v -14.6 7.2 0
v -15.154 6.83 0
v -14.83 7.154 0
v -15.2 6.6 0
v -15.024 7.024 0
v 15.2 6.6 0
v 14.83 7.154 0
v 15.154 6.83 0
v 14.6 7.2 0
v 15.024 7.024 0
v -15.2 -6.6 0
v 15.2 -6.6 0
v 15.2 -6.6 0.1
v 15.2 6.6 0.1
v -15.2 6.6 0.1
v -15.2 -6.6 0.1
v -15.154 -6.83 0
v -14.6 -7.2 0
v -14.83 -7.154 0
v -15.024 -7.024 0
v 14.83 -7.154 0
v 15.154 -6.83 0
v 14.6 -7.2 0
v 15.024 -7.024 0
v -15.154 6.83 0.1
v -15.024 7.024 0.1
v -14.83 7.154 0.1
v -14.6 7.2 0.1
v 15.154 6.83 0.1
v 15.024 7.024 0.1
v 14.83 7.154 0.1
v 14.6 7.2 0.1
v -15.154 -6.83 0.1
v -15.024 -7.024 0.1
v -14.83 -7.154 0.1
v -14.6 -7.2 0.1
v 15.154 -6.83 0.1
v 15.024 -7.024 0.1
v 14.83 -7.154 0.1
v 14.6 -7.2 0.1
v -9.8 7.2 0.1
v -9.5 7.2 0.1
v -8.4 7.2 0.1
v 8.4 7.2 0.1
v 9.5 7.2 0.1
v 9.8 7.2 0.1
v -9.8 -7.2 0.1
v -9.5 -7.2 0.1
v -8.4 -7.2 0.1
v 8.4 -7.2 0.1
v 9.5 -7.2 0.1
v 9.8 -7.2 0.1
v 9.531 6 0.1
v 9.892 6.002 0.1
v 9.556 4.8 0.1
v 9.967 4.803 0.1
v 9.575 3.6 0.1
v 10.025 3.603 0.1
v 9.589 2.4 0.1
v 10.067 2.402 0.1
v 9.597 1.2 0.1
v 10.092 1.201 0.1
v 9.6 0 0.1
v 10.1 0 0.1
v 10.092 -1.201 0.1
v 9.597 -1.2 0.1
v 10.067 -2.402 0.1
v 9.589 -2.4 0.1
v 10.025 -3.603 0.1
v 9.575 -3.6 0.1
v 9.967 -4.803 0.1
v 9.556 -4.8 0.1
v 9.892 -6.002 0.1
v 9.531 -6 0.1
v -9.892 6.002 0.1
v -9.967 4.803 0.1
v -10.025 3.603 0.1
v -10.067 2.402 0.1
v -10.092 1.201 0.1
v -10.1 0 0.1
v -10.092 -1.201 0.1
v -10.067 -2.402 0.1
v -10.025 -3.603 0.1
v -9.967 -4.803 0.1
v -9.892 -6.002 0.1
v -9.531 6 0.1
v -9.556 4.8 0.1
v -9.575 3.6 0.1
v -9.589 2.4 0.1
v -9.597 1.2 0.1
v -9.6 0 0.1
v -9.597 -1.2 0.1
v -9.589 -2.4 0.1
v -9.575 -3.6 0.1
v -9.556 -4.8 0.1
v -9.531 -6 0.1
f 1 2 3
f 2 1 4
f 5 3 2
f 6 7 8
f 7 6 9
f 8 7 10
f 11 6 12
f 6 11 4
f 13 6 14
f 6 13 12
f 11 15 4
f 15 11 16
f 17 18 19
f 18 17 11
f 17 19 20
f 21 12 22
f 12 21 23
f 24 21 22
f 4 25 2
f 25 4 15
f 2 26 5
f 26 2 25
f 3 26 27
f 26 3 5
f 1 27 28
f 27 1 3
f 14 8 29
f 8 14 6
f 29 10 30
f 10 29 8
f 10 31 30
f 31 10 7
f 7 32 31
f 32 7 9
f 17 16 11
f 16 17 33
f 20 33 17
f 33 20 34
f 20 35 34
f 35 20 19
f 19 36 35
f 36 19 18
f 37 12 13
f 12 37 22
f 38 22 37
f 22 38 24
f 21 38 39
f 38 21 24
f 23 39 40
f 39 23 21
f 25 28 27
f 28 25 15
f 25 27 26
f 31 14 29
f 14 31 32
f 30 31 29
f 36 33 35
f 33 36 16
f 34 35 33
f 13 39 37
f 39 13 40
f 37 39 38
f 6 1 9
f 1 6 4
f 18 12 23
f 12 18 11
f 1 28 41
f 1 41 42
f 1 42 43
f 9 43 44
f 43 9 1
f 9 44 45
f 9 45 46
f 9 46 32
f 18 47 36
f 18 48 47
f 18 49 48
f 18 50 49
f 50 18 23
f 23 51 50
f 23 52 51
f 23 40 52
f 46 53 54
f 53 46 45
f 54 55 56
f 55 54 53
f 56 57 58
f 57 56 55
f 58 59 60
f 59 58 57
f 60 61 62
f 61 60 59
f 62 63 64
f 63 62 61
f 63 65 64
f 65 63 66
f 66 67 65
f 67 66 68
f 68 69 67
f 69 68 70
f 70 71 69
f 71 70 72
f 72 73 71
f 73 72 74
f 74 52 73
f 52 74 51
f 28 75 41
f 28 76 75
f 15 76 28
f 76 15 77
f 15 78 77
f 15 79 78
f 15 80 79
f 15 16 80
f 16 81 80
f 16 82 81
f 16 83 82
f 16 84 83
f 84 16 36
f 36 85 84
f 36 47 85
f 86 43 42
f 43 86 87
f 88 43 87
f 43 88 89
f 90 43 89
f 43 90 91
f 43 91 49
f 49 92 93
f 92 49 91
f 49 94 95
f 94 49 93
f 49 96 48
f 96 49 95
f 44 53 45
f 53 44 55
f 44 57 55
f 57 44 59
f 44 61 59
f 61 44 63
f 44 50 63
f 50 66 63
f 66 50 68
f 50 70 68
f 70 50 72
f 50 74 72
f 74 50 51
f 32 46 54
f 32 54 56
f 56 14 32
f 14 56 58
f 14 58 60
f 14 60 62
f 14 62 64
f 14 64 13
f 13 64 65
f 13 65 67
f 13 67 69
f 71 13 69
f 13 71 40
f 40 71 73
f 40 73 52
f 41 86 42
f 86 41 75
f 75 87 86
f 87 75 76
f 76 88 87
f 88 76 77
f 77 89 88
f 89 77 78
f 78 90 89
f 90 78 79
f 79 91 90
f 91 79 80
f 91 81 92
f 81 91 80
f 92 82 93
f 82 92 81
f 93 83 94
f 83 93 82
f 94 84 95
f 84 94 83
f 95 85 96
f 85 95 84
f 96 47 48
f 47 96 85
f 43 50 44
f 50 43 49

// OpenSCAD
// file: ../p/box3u12.scad
use <../lib.scad>
function ldraw_lib__box3u12() = [
// 0 Box with 3 Parallel Faces without Any Edges
// 0 Name: box3u12.dat
// 0 Author: J.C. Tchang [tchang]
// 0 !LDRAW_ORG Primitive UPDATE 2014-02
// 0 !LICENSE Licensed under CC BY 4.0 : see CAreadme.txt
// 
// 0 BFC CERTIFY CCW
  [0,"BFC","CERTIFY"],
  [0,"BFC","CCW"],
// 
// 0 !HISTORY 2014-12-23 [PTadmin] Official Update 2014-02
// 
// 
// 4 16 -1 1 1 1 1 1 1 1 -1 -1 1 -1
  [4,16,-1,1,1,1,1,1,1,1,-1,-1,1,-1],
// 4 16 -1 1 1 -1 0 1 1 0 1 1 1 1
  [4,16,-1,1,1,-1,0,1,1,0,1,1,1,1],
// 4 16 1 1 -1 1 0 -1 -1 0 -1 -1 1 -1
  [4,16,1,1,-1,1,0,-1,-1,0,-1,-1,1,-1],
];
module ldraw_lib__box3u12(step=0, col=false, unit=2/5, alt=false, line=0.2, solid=!$preview)
    makepoly(ldraw_lib__box3u12(), step=step, col=col, unit=unit, alt=alt, line=line, solid=solid);
ldraw_lib__box3u12(line=0.2);
// file: ../p/1-4cyli.scad
use <../lib.scad>
function ldraw_lib__1_4cyli() = [
// 0 Cylinder 0.25
// 0 Name: 1-4cyli.dat
// 0 Author: James Jessiman
// 0 !LDRAW_ORG Primitive UPDATE 2012-01
// 0 !LICENSE Licensed under CC BY 4.0 : see CAreadme.txt
// 
// 0 BFC CERTIFY CCW
  [0,"BFC","CERTIFY"],
  [0,"BFC","CCW"],
// 
// 0 !HISTORY 2002-03-23 [sbliss] Added BFC statement.
// 0 !HISTORY 2002-04-25 [PTadmin] Official Update 2002-02
// 0 !HISTORY 2007-06-22 [PTadmin] Header formatted for Contributor Agreement
// 0 !HISTORY 2008-07-01 [PTadmin] Official Update 2008-01
// 0 !HISTORY 2012-02-16 [Philo] Changed to CCW
// 0 !HISTORY 2012-03-30 [PTadmin] Official Update 2012-01
// 
// 
// 4 16 1 1 0 0.9239 1 0.3827 0.9239 0 0.3827 1 0 0
  [4,16,1,1,0,0.9239,1,0.3827,0.9239,0,0.3827,1,0,0],
// 5 24 1 0 0 1 1 0 0.9239 0 0.3827 1 0 -1
  [5,24,1,0,0,1,1,0,0.9239,0,0.3827,1,0,-1],
// 4 16 0.9239 1 0.3827 0.7071 1 0.7071 0.7071 0 0.7071 0.9239 0 0.3827
  [4,16,0.9239,1,0.3827,0.7071,1,0.7071,0.7071,0,0.7071,0.9239,0,0.3827],
// 5 24 0.9239 0 0.3827 0.9239 1 0.3827 0.7071 0 0.7071 1 0 0
  [5,24,0.9239,0,0.3827,0.9239,1,0.3827,0.7071,0,0.7071,1,0,0],
// 4 16 0.7071 1 0.7071 0.3827 1 0.9239 0.3827 0 0.9239 0.7071 0 0.7071
  [4,16,0.7071,1,0.7071,0.3827,1,0.9239,0.3827,0,0.9239,0.7071,0,0.7071],
// 5 24 0.7071 0 0.7071 0.7071 1 0.7071 0.3827 0 0.9239 0.9239 0 0.3827
  [5,24,0.7071,0,0.7071,0.7071,1,0.7071,0.3827,0,0.9239,0.9239,0,0.3827],
// 4 16 0.3827 1 0.9239 0 1 1 0 0 1 0.3827 0 0.9239
  [4,16,0.3827,1,0.9239,0,1,1,0,0,1,0.3827,0,0.9239],
// 5 24 0.3827 0 0.9239 0.3827 1 0.9239 0 0 1 0.7071 0 0.7071
  [5,24,0.3827,0,0.9239,0.3827,1,0.9239,0,0,1,0.7071,0,0.7071],
// 5 24 0 0 1 0 1 1 0.3827 0 0.9239 -1 0 1
  [5,24,0,0,1,0,1,1,0.3827,0,0.9239,-1,0,1],
];
module ldraw_lib__1_4cyli(step=0, col=false, unit=2/5, alt=false, line=0.2, solid=!$preview)
    makepoly(ldraw_lib__1_4cyli(), step=step, col=col, unit=unit, alt=alt, line=line, solid=solid);
ldraw_lib__1_4cyli(line=0.2);
// file: ../p/1-4chrd.scad
use <../lib.scad>
function ldraw_lib__1_4chrd() = [
// 0 Chord 0.25
// 0 Name: 1-4chrd.dat
// 0 Author: Max Martin Richter [MMR1988]
// 0 !LDRAW_ORG Primitive UPDATE 2023-05
// 0 !LICENSE Licensed under CC BY 4.0 : see CAreadme.txt
// 
// 0 BFC CERTIFY CCW
  [0,"BFC","CERTIFY"],
  [0,"BFC","CCW"],
// 
// 0 !HISTORY 2004-04-22 [PTadmin] Official Update 2004-02
// 0 !HISTORY 2007-10-09 [PTadmin] Header formatted for Contributor Agreement
// 0 !HISTORY 2008-07-01 [PTadmin] Official Update 2008-01
// 0 !HISTORY 2012-08-02 [MMR1988] Re-creation with PrimGen2 and Rectifier
// 0 !HISTORY 2012-08-09 [PTadmin] Official Update 2012-02
// 0 !HISTORY 2023-10-27 [OrionP] Change author to MMR1988 from hafhead
// 0 !HISTORY 2023-10-31 [OrionP] Official Update 2023-05
// 
// 4 16 0.9239 0 0.3827 0.3827 0 0.9239 0 0 1 1 0 0
  [4,16,0.9239,0,0.3827,0.3827,0,0.9239,0,0,1,1,0,0],
// 3 16 0.7071 0 0.7071 0.3827 0 0.9239 0.9239 0 0.3827
  [3,16,0.7071,0,0.7071,0.3827,0,0.9239,0.9239,0,0.3827],
];
module ldraw_lib__1_4chrd(step=0, col=false, unit=2/5, alt=false, line=0.2, solid=!$preview)
    makepoly(ldraw_lib__1_4chrd(), step=step, col=col, unit=unit, alt=alt, line=line, solid=solid);
ldraw_lib__1_4chrd(line=0.2);
// main file
use <../lib.scad>
use <../p/1-4chrd.scad>
use <../p/1-4cyli.scad>
use <../p/box3u12.scad>
function ldraw_lib__6141955c() = [
// 0 Sticker  1.8 x  3.8 with White Stripe and Black and White Arcs on Blue Background (Needs Work)
// 0 Name: 6141955c.dat
// 0 Author: Massimo Maso [Sirio]
// 0 !LDRAW_ORG Part UPDATE 2025-03
// 0 !LICENSE Licensed under CC BY 4.0 : see CAreadme.txt
// 
// 0 !HELP Needs work: Some parts should be halftones.
// 0 !HELP I indicated them as halftone color code disc - color code ndis.
// 0 !HELP For now I don't have enough information to create the matrix of dots.
// 
// 0 BFC CERTIFY CCW
  [0,"BFC","CERTIFY"],
  [0,"BFC","CCW"],
// 
// 0 !KEYWORDS Bricklink 75871stk01a, Brickowl 197362, Ford, GT, Mustang
// 0 !KEYWORDS Rebrickable 24746, Set 75871, Speed Champions
// 
// 0 !HISTORY 2025-03-30 [OrionP] Official Update 2025-03
// 
// 
// 0 // Primitives
// 1 16 -36.5 0 16.5 -1.5 0 0 0 -1 0 0 0 1.5 1-4chrd.dat
  [1,16,-36.5,0,16.5,-1.5,0,0,0,-1,0,0,0,1.5, ldraw_lib__1_4chrd()],
// 1 16 36.5 0 16.5 1.5 0 0 0 -1 0 0 0 1.5 1-4chrd.dat
  [1,16,36.5,0,16.5,1.5,0,0,0,-1,0,0,0,1.5, ldraw_lib__1_4chrd()],
// 1 16 0 -.25 0 0 0 38 0 .25 0 16.5 0 0 box3u12.dat
  [1,16,0,-.25,0,0,0,38,0,.25,0,16.5,0,0, ldraw_lib__box3u12()],
// 1 16 -36.5 0 -16.5 -1.5 0 0 0 -1 0 0 0 -1.5 1-4chrd.dat
  [1,16,-36.5,0,-16.5,-1.5,0,0,0,-1,0,0,0,-1.5, ldraw_lib__1_4chrd()],
// 1 16 36.5 0 -16.5 1.5 0 0 0 -1 0 0 0 -1.5 1-4chrd.dat
  [1,16,36.5,0,-16.5,1.5,0,0,0,-1,0,0,0,-1.5, ldraw_lib__1_4chrd()],
// 1 16 -36.5 0 16.5 -1.5 0 0 0 -.25 0 0 0 1.5 1-4cyli.dat
  [1,16,-36.5,0,16.5,-1.5,0,0,0,-.25,0,0,0,1.5, ldraw_lib__1_4cyli()],
// 1 16 36.5 0 16.5 1.5 0 0 0 -.25 0 0 0 1.5 1-4cyli.dat
  [1,16,36.5,0,16.5,1.5,0,0,0,-.25,0,0,0,1.5, ldraw_lib__1_4cyli()],
// 1 16 -36.5 0 -16.5 -1.5 0 0 0 -.25 0 0 0 -1.5 1-4cyli.dat
  [1,16,-36.5,0,-16.5,-1.5,0,0,0,-.25,0,0,0,-1.5, ldraw_lib__1_4cyli()],
// 1 16 36.5 0 -16.5 1.5 0 0 0 -.25 0 0 0 -1.5 1-4cyli.dat
  [1,16,36.5,0,-16.5,1.5,0,0,0,-.25,0,0,0,-1.5, ldraw_lib__1_4cyli()],
// 1 1 -36.5 -.25 16.5 -1.5 0 0 0 1 0 0 0 1.5 1-4chrd.dat
  [1,1,-36.5,-.25,16.5,-1.5,0,0,0,1,0,0,0,1.5, ldraw_lib__1_4chrd()],
// 1 1 36.5 -.25 16.5 1.5 0 0 0 1 0 0 0 1.5 1-4chrd.dat
  [1,1,36.5,-.25,16.5,1.5,0,0,0,1,0,0,0,1.5, ldraw_lib__1_4chrd()],
// 1 1 -36.5 -.25 -16.5 -1.5 0 0 0 1 0 0 0 -1.5 1-4chrd.dat
  [1,1,-36.5,-.25,-16.5,-1.5,0,0,0,1,0,0,0,-1.5, ldraw_lib__1_4chrd()],
// 1 1 36.5 -.25 -16.5 1.5 0 0 0 1 0 0 0 -1.5 1-4chrd.dat
  [1,1,36.5,-.25,-16.5,1.5,0,0,0,1,0,0,0,-1.5, ldraw_lib__1_4chrd()],
// 0 // Bottom face
// 4 16 36.5 0 18 38 0 16.5 -38 0 16.5 -36.5 0 18
  [4,16,36.5,0,18,38,0,16.5,-38,0,16.5,-36.5,0,18],
// 4 16 36.5 0 -18 -36.5 0 -18 -38 0 -16.5 38 0 -16.5
  [4,16,36.5,0,-18,-36.5,0,-18,-38,0,-16.5,38,0,-16.5],
// 0 // Lateral face
// 3 16 -36.5 0 18 -36.5 -.25 18 -24.5 -.25 18
  [3,16,-36.5,0,18,-36.5,-.25,18,-24.5,-.25,18],
// 3 16 -36.5 0 18 -24.5 -.25 18 -23.75 -.25 18
  [3,16,-36.5,0,18,-24.5,-.25,18,-23.75,-.25,18],
// 3 16 -36.5 0 18 -23.75 -.25 18 -21 -.25 18
  [3,16,-36.5,0,18,-23.75,-.25,18,-21,-.25,18],
// 4 16 -36.5 0 18 -21 -.25 18 21 -.25 18 36.5 0 18
  [4,16,-36.5,0,18,-21,-.25,18,21,-.25,18,36.5,0,18],
// 3 16 36.5 0 18 21 -.25 18 23.75 -.25 18
  [3,16,36.5,0,18,21,-.25,18,23.75,-.25,18],
// 3 16 36.5 0 18 23.75 -.25 18 24.5 -.25 18
  [3,16,36.5,0,18,23.75,-.25,18,24.5,-.25,18],
// 3 16 36.5 0 18 24.5 -.25 18 36.5 -.25 18
  [3,16,36.5,0,18,24.5,-.25,18,36.5,-.25,18],
// 3 16 -36.5 0 -18 -24.5 -.25 -18 -36.5 -.25 -18
  [3,16,-36.5,0,-18,-24.5,-.25,-18,-36.5,-.25,-18],
// 3 16 -36.5 0 -18 -23.75 -.25 -18 -24.5 -.25 -18
  [3,16,-36.5,0,-18,-23.75,-.25,-18,-24.5,-.25,-18],
// 3 16 -36.5 0 -18 -21 -.25 -18 -23.75 -.25 -18
  [3,16,-36.5,0,-18,-21,-.25,-18,-23.75,-.25,-18],
// 4 16 -36.5 0 -18 36.5 0 -18 21 -.25 -18 -21 -.25 -18
  [4,16,-36.5,0,-18,36.5,0,-18,21,-.25,-18,-21,-.25,-18],
// 3 16 36.5 0 -18 23.75 -.25 -18 21 -.25 -18
  [3,16,36.5,0,-18,23.75,-.25,-18,21,-.25,-18],
// 3 16 36.5 0 -18 24.5 -.25 -18 23.75 -.25 -18
  [3,16,36.5,0,-18,24.5,-.25,-18,23.75,-.25,-18],
// 3 16 36.5 0 -18 36.5 -.25 -18 24.5 -.25 -18
  [3,16,36.5,0,-18,36.5,-.25,-18,24.5,-.25,-18],
// 0 // Top face
// 0 // Black arc faces
// 4 0 24.7291 -.25 15.0053 24.5 -.25 18 23.75 -.25 18 23.8264 -.25 15.0006
  [4,0,24.7291,-.25,15.0053,24.5,-.25,18,23.75,-.25,18,23.8264,-.25,15.0006],
// 4 0 24.7291 -.25 15.0053 23.8264 -.25 15.0006 23.8889 -.25 12.0009 24.9166 -.25 12.0077
  [4,0,24.7291,-.25,15.0053,23.8264,-.25,15.0006,23.8889,-.25,12.0009,24.9166,-.25,12.0077],
// 4 0 25.0624 -.25 9.0078 24.9166 -.25 12.0077 23.8889 -.25 12.0009 23.9375 -.25 9.0009
  [4,0,25.0624,-.25,9.0078,24.9166,-.25,12.0077,23.8889,-.25,12.0009,23.9375,-.25,9.0009],
// 4 0 25.0624 -.25 9.0078 23.9375 -.25 9.0009 23.9722 -.25 6.0007 25.1666 -.25 6.0062
  [4,0,25.0624,-.25,9.0078,23.9375,-.25,9.0009,23.9722,-.25,6.0007,25.1666,-.25,6.0062],
// 4 0 25.2292 -.25 3.0034 25.1666 -.25 6.0062 23.9722 -.25 6.0007 23.9931 -.25 3.0004
  [4,0,25.2292,-.25,3.0034,25.1666,-.25,6.0062,23.9722,-.25,6.0007,23.9931,-.25,3.0004],
// 4 0 25.2292 -.25 3.0034 23.9931 -.25 3.0004 24 -.25 0 25.25 -.25 0
  [4,0,25.2292,-.25,3.0034,23.9931,-.25,3.0004,24,-.25,0,25.25,-.25,0],
// 4 0 25.2292 -.25 -3.0034 25.25 -.25 0 24 -.25 0 23.9931 -.25 -3.0004
  [4,0,25.2292,-.25,-3.0034,25.25,-.25,0,24,-.25,0,23.9931,-.25,-3.0004],
// 4 0 25.2292 -.25 -3.0034 23.9931 -.25 -3.0004 23.9722 -.25 -6.0007 25.1666 -.25 -6.0062
  [4,0,25.2292,-.25,-3.0034,23.9931,-.25,-3.0004,23.9722,-.25,-6.0007,25.1666,-.25,-6.0062],
// 4 0 25.0624 -.25 -9.0078 25.1666 -.25 -6.0062 23.9722 -.25 -6.0007 23.9375 -.25 -9.0009
  [4,0,25.0624,-.25,-9.0078,25.1666,-.25,-6.0062,23.9722,-.25,-6.0007,23.9375,-.25,-9.0009],
// 4 0 25.0624 -.25 -9.0078 23.9375 -.25 -9.0009 23.8889 -.25 -12.0009 24.9166 -.25 -12.0077
  [4,0,25.0624,-.25,-9.0078,23.9375,-.25,-9.0009,23.8889,-.25,-12.0009,24.9166,-.25,-12.0077],
// 4 0 24.7291 -.25 -15.0053 24.9166 -.25 -12.0077 23.8889 -.25 -12.0009 23.8264 -.25 -15.0006
  [4,0,24.7291,-.25,-15.0053,24.9166,-.25,-12.0077,23.8889,-.25,-12.0009,23.8264,-.25,-15.0006],
// 4 0 24.7291 -.25 -15.0053 23.8264 -.25 -15.0006 23.75 -.25 -18 24.5 -.25 -18
  [4,0,24.7291,-.25,-15.0053,23.8264,-.25,-15.0006,23.75,-.25,-18,24.5,-.25,-18],
// 0 // Blue faces
// 3 1 -36.5 -.25 18 -24.7291 -.25 15.0053 -24.5 -.25 18
  [3,1,-36.5,-.25,18,-24.7291,-.25,15.0053,-24.5,-.25,18],
// 3 1 -36.5 -.25 18 -24.9166 -.25 12.0077 -24.7291 -.25 15.0053
  [3,1,-36.5,-.25,18,-24.9166,-.25,12.0077,-24.7291,-.25,15.0053],
// 4 1 -36.5 -.25 18 -38 -.25 16.5 -25.0624 -.25 9.0078 -24.9166 -.25 12.0077
  [4,1,-36.5,-.25,18,-38,-.25,16.5,-25.0624,-.25,9.0078,-24.9166,-.25,12.0077],
// 3 1 -38 -.25 16.5 -25.1666 -.25 6.0062 -25.0624 -.25 9.0078
  [3,1,-38,-.25,16.5,-25.1666,-.25,6.0062,-25.0624,-.25,9.0078],
// 3 1 -38 -.25 16.5 -25.2292 -.25 3.0034 -25.1666 -.25 6.0062
  [3,1,-38,-.25,16.5,-25.2292,-.25,3.0034,-25.1666,-.25,6.0062],
// 3 1 -38 -.25 16.5 -25.25 -.25 0 -25.2292 -.25 3.0034
  [3,1,-38,-.25,16.5,-25.25,-.25,0,-25.2292,-.25,3.0034],
// 3 1 -38 -.25 16.5 -38 -.25 -16.5 -25.25 -.25 0
  [3,1,-38,-.25,16.5,-38,-.25,-16.5,-25.25,-.25,0],
// 3 1 -38 -.25 -16.5 -25.2292 -.25 -3.0034 -25.25 -.25 0
  [3,1,-38,-.25,-16.5,-25.2292,-.25,-3.0034,-25.25,-.25,0],
// 3 1 -38 -.25 -16.5 -25.1666 -.25 -6.0062 -25.2292 -.25 -3.0034
  [3,1,-38,-.25,-16.5,-25.1666,-.25,-6.0062,-25.2292,-.25,-3.0034],
// 3 1 -38 -.25 -16.5 -25.0624 -.25 -9.0078 -25.1666 -.25 -6.0062
  [3,1,-38,-.25,-16.5,-25.0624,-.25,-9.0078,-25.1666,-.25,-6.0062],
// 4 1 -36.5 -.25 -18 -24.9166 -.25 -12.0077 -25.0624 -.25 -9.0078 -38 -.25 -16.5
  [4,1,-36.5,-.25,-18,-24.9166,-.25,-12.0077,-25.0624,-.25,-9.0078,-38,-.25,-16.5],
// 3 1 -36.5 -.25 -18 -24.7291 -.25 -15.0053 -24.9166 -.25 -12.0077
  [3,1,-36.5,-.25,-18,-24.7291,-.25,-15.0053,-24.9166,-.25,-12.0077],
// 3 1 -36.5 -.25 -18 -24.5 -.25 -18 -24.7291 -.25 -15.0053
  [3,1,-36.5,-.25,-18,-24.5,-.25,-18,-24.7291,-.25,-15.0053],
// 4 1 -21 -.25 18 -23.75 -.25 18 -23.8264 -.25 15.0006 -23.8889 -.25 12.0009
  [4,1,-21,-.25,18,-23.75,-.25,18,-23.8264,-.25,15.0006,-23.8889,-.25,12.0009],
// 4 1 -21 -.25 18 -23.8889 -.25 12.0009 -23.9375 -.25 9.0009 -23.9722 -.25 6.0007
  [4,1,-21,-.25,18,-23.8889,-.25,12.0009,-23.9375,-.25,9.0009,-23.9722,-.25,6.0007],
// 4 1 -21 -.25 18 -23.9722 -.25 6.0007 -23.9931 -.25 3.0004 -24 -.25 0
  [4,1,-21,-.25,18,-23.9722,-.25,6.0007,-23.9931,-.25,3.0004,-24,-.25,0],
// 3 1 -21 -.25 18 -24 -.25 0 -21 -.25 -18
  [3,1,-21,-.25,18,-24,-.25,0,-21,-.25,-18],
// 4 1 -21 -.25 -18 -24 -.25 0 -23.9931 -.25 -3.0004 -23.9722 -.25 -6.0007
  [4,1,-21,-.25,-18,-24,-.25,0,-23.9931,-.25,-3.0004,-23.9722,-.25,-6.0007],
// 4 1 -21 -.25 -18 -23.9722 -.25 -6.0007 -23.9375 -.25 -9.0009 -23.8889 -.25 -12.0009
  [4,1,-21,-.25,-18,-23.9722,-.25,-6.0007,-23.9375,-.25,-9.0009,-23.8889,-.25,-12.0009],
// 4 1 -21 -.25 -18 -23.8889 -.25 -12.0009 -23.8264 -.25 -15.0006 -23.75 -.25 -18
  [4,1,-21,-.25,-18,-23.8889,-.25,-12.0009,-23.8264,-.25,-15.0006,-23.75,-.25,-18],
// 4 1 21 -.25 18 23.8889 -.25 12.0009 23.8264 -.25 15.0006 23.75 -.25 18
  [4,1,21,-.25,18,23.8889,-.25,12.0009,23.8264,-.25,15.0006,23.75,-.25,18],
// 4 1 21 -.25 18 23.9722 -.25 6.0007 23.9375 -.25 9.0009 23.8889 -.25 12.0009
  [4,1,21,-.25,18,23.9722,-.25,6.0007,23.9375,-.25,9.0009,23.8889,-.25,12.0009],
// 4 1 21 -.25 18 24 -.25 0 23.9931 -.25 3.0004 23.9722 -.25 6.0007
  [4,1,21,-.25,18,24,-.25,0,23.9931,-.25,3.0004,23.9722,-.25,6.0007],
// 3 1 21 -.25 18 21 -.25 -18 24 -.25 0
  [3,1,21,-.25,18,21,-.25,-18,24,-.25,0],
// 4 1 21 -.25 -18 23.9722 -.25 -6.0007 23.9931 -.25 -3.0004 24 -.25 0
  [4,1,21,-.25,-18,23.9722,-.25,-6.0007,23.9931,-.25,-3.0004,24,-.25,0],
// 4 1 21 -.25 -18 23.8889 -.25 -12.0009 23.9375 -.25 -9.0009 23.9722 -.25 -6.0007
  [4,1,21,-.25,-18,23.8889,-.25,-12.0009,23.9375,-.25,-9.0009,23.9722,-.25,-6.0007],
// 4 1 21 -.25 -18 23.75 -.25 -18 23.8264 -.25 -15.0006 23.8889 -.25 -12.0009
  [4,1,21,-.25,-18,23.75,-.25,-18,23.8264,-.25,-15.0006,23.8889,-.25,-12.0009],
// 3 1 36.5 -.25 18 24.5 -.25 18 24.7291 -.25 15.0053
  [3,1,36.5,-.25,18,24.5,-.25,18,24.7291,-.25,15.0053],
// 3 1 36.5 -.25 18 24.7291 -.25 15.0053 24.9166 -.25 12.0077
  [3,1,36.5,-.25,18,24.7291,-.25,15.0053,24.9166,-.25,12.0077],
// 4 1 36.5 -.25 18 24.9166 -.25 12.0077 25.0624 -.25 9.0078 38 -.25 16.5
  [4,1,36.5,-.25,18,24.9166,-.25,12.0077,25.0624,-.25,9.0078,38,-.25,16.5],
// 3 1 38 -.25 16.5 25.0624 -.25 9.0078 25.1666 -.25 6.0062
  [3,1,38,-.25,16.5,25.0624,-.25,9.0078,25.1666,-.25,6.0062],
// 3 1 38 -.25 16.5 25.1666 -.25 6.0062 25.2292 -.25 3.0034
  [3,1,38,-.25,16.5,25.1666,-.25,6.0062,25.2292,-.25,3.0034],
// 3 1 38 -.25 16.5 25.2292 -.25 3.0034 25.25 -.25 0
  [3,1,38,-.25,16.5,25.2292,-.25,3.0034,25.25,-.25,0],
// 3 1 38 -.25 16.5 25.25 -.25 0 38 -.25 -16.5
  [3,1,38,-.25,16.5,25.25,-.25,0,38,-.25,-16.5],
// 3 1 38 -.25 -16.5 25.25 -.25 0 25.2292 -.25 -3.0034
  [3,1,38,-.25,-16.5,25.25,-.25,0,25.2292,-.25,-3.0034],
// 3 1 38 -.25 -16.5 25.2292 -.25 -3.0034 25.1666 -.25 -6.0062
  [3,1,38,-.25,-16.5,25.2292,-.25,-3.0034,25.1666,-.25,-6.0062],
// 3 1 38 -.25 -16.5 25.1666 -.25 -6.0062 25.0624 -.25 -9.0078
  [3,1,38,-.25,-16.5,25.1666,-.25,-6.0062,25.0624,-.25,-9.0078],
// 4 1 36.5 -.25 -18 38 -.25 -16.5 25.0624 -.25 -9.0078 24.9166 -.25 -12.0077
  [4,1,36.5,-.25,-18,38,-.25,-16.5,25.0624,-.25,-9.0078,24.9166,-.25,-12.0077],
// 3 1 36.5 -.25 -18 24.9166 -.25 -12.0077 24.7291 -.25 -15.0053
  [3,1,36.5,-.25,-18,24.9166,-.25,-12.0077,24.7291,-.25,-15.0053],
// 3 1 36.5 -.25 -18 24.7291 -.25 -15.0053 24.5 -.25 -18
  [3,1,36.5,-.25,-18,24.7291,-.25,-15.0053,24.5,-.25,-18],
// 0 // White arc faces - Actually halftone 0 disc - 15 ndis
// 4 15 -24.7291 -.25 15.0053 -23.8264 -.25 15.0006 -23.75 -.25 18 -24.5 -.25 18
  [4,15,-24.7291,-.25,15.0053,-23.8264,-.25,15.0006,-23.75,-.25,18,-24.5,-.25,18],
// 4 15 -24.7291 -.25 15.0053 -24.9166 -.25 12.0077 -23.8889 -.25 12.0009 -23.8264 -.25 15.0006
  [4,15,-24.7291,-.25,15.0053,-24.9166,-.25,12.0077,-23.8889,-.25,12.0009,-23.8264,-.25,15.0006],
// 4 15 -25.0624 -.25 9.0078 -23.9375 -.25 9.0009 -23.8889 -.25 12.0009 -24.9166 -.25 12.0077
  [4,15,-25.0624,-.25,9.0078,-23.9375,-.25,9.0009,-23.8889,-.25,12.0009,-24.9166,-.25,12.0077],
// 4 15 -25.0624 -.25 9.0078 -25.1666 -.25 6.0062 -23.9722 -.25 6.0007 -23.9375 -.25 9.0009
  [4,15,-25.0624,-.25,9.0078,-25.1666,-.25,6.0062,-23.9722,-.25,6.0007,-23.9375,-.25,9.0009],
// 4 15 -25.2292 -.25 3.0034 -23.9931 -.25 3.0004 -23.9722 -.25 6.0007 -25.1666 -.25 6.0062
  [4,15,-25.2292,-.25,3.0034,-23.9931,-.25,3.0004,-23.9722,-.25,6.0007,-25.1666,-.25,6.0062],
// 4 15 -25.2292 -.25 3.0034 -25.25 -.25 0 -24 -.25 0 -23.9931 -.25 3.0004
  [4,15,-25.2292,-.25,3.0034,-25.25,-.25,0,-24,-.25,0,-23.9931,-.25,3.0004],
// 4 15 -25.2292 -.25 -3.0034 -23.9931 -.25 -3.0004 -24 -.25 0 -25.25 -.25 0
  [4,15,-25.2292,-.25,-3.0034,-23.9931,-.25,-3.0004,-24,-.25,0,-25.25,-.25,0],
// 4 15 -25.2292 -.25 -3.0034 -25.1666 -.25 -6.0062 -23.9722 -.25 -6.0007 -23.9931 -.25 -3.0004
  [4,15,-25.2292,-.25,-3.0034,-25.1666,-.25,-6.0062,-23.9722,-.25,-6.0007,-23.9931,-.25,-3.0004],
// 4 15 -25.0624 -.25 -9.0078 -23.9375 -.25 -9.0009 -23.9722 -.25 -6.0007 -25.1666 -.25 -6.0062
  [4,15,-25.0624,-.25,-9.0078,-23.9375,-.25,-9.0009,-23.9722,-.25,-6.0007,-25.1666,-.25,-6.0062],
// 4 15 -25.0624 -.25 -9.0078 -24.9166 -.25 -12.0077 -23.8889 -.25 -12.0009 -23.9375 -.25 -9.0009
  [4,15,-25.0624,-.25,-9.0078,-24.9166,-.25,-12.0077,-23.8889,-.25,-12.0009,-23.9375,-.25,-9.0009],
// 4 15 -24.7291 -.25 -15.0053 -23.8264 -.25 -15.0006 -23.8889 -.25 -12.0009 -24.9166 -.25 -12.0077
  [4,15,-24.7291,-.25,-15.0053,-23.8264,-.25,-15.0006,-23.8889,-.25,-12.0009,-24.9166,-.25,-12.0077],
// 4 15 -24.7291 -.25 -15.0053 -24.5 -.25 -18 -23.75 -.25 -18 -23.8264 -.25 -15.0006
  [4,15,-24.7291,-.25,-15.0053,-24.5,-.25,-18,-23.75,-.25,-18,-23.8264,-.25,-15.0006],
// 0 // White top face
// 4 15 -21 -.25 18 -21 -.25 -18 21 -.25 -18 21 -.25 18
  [4,15,-21,-.25,18,-21,-.25,-18,21,-.25,-18,21,-.25,18],
];
module ldraw_lib__6141955c(step=0, col=false, unit=2/5, alt=false, line=0.2, solid=!$preview)
    makepoly(ldraw_lib__6141955c(), step=step, col=col, unit=unit, alt=alt, line=line, solid=solid);
ldraw_lib__6141955c(line=0.2);
